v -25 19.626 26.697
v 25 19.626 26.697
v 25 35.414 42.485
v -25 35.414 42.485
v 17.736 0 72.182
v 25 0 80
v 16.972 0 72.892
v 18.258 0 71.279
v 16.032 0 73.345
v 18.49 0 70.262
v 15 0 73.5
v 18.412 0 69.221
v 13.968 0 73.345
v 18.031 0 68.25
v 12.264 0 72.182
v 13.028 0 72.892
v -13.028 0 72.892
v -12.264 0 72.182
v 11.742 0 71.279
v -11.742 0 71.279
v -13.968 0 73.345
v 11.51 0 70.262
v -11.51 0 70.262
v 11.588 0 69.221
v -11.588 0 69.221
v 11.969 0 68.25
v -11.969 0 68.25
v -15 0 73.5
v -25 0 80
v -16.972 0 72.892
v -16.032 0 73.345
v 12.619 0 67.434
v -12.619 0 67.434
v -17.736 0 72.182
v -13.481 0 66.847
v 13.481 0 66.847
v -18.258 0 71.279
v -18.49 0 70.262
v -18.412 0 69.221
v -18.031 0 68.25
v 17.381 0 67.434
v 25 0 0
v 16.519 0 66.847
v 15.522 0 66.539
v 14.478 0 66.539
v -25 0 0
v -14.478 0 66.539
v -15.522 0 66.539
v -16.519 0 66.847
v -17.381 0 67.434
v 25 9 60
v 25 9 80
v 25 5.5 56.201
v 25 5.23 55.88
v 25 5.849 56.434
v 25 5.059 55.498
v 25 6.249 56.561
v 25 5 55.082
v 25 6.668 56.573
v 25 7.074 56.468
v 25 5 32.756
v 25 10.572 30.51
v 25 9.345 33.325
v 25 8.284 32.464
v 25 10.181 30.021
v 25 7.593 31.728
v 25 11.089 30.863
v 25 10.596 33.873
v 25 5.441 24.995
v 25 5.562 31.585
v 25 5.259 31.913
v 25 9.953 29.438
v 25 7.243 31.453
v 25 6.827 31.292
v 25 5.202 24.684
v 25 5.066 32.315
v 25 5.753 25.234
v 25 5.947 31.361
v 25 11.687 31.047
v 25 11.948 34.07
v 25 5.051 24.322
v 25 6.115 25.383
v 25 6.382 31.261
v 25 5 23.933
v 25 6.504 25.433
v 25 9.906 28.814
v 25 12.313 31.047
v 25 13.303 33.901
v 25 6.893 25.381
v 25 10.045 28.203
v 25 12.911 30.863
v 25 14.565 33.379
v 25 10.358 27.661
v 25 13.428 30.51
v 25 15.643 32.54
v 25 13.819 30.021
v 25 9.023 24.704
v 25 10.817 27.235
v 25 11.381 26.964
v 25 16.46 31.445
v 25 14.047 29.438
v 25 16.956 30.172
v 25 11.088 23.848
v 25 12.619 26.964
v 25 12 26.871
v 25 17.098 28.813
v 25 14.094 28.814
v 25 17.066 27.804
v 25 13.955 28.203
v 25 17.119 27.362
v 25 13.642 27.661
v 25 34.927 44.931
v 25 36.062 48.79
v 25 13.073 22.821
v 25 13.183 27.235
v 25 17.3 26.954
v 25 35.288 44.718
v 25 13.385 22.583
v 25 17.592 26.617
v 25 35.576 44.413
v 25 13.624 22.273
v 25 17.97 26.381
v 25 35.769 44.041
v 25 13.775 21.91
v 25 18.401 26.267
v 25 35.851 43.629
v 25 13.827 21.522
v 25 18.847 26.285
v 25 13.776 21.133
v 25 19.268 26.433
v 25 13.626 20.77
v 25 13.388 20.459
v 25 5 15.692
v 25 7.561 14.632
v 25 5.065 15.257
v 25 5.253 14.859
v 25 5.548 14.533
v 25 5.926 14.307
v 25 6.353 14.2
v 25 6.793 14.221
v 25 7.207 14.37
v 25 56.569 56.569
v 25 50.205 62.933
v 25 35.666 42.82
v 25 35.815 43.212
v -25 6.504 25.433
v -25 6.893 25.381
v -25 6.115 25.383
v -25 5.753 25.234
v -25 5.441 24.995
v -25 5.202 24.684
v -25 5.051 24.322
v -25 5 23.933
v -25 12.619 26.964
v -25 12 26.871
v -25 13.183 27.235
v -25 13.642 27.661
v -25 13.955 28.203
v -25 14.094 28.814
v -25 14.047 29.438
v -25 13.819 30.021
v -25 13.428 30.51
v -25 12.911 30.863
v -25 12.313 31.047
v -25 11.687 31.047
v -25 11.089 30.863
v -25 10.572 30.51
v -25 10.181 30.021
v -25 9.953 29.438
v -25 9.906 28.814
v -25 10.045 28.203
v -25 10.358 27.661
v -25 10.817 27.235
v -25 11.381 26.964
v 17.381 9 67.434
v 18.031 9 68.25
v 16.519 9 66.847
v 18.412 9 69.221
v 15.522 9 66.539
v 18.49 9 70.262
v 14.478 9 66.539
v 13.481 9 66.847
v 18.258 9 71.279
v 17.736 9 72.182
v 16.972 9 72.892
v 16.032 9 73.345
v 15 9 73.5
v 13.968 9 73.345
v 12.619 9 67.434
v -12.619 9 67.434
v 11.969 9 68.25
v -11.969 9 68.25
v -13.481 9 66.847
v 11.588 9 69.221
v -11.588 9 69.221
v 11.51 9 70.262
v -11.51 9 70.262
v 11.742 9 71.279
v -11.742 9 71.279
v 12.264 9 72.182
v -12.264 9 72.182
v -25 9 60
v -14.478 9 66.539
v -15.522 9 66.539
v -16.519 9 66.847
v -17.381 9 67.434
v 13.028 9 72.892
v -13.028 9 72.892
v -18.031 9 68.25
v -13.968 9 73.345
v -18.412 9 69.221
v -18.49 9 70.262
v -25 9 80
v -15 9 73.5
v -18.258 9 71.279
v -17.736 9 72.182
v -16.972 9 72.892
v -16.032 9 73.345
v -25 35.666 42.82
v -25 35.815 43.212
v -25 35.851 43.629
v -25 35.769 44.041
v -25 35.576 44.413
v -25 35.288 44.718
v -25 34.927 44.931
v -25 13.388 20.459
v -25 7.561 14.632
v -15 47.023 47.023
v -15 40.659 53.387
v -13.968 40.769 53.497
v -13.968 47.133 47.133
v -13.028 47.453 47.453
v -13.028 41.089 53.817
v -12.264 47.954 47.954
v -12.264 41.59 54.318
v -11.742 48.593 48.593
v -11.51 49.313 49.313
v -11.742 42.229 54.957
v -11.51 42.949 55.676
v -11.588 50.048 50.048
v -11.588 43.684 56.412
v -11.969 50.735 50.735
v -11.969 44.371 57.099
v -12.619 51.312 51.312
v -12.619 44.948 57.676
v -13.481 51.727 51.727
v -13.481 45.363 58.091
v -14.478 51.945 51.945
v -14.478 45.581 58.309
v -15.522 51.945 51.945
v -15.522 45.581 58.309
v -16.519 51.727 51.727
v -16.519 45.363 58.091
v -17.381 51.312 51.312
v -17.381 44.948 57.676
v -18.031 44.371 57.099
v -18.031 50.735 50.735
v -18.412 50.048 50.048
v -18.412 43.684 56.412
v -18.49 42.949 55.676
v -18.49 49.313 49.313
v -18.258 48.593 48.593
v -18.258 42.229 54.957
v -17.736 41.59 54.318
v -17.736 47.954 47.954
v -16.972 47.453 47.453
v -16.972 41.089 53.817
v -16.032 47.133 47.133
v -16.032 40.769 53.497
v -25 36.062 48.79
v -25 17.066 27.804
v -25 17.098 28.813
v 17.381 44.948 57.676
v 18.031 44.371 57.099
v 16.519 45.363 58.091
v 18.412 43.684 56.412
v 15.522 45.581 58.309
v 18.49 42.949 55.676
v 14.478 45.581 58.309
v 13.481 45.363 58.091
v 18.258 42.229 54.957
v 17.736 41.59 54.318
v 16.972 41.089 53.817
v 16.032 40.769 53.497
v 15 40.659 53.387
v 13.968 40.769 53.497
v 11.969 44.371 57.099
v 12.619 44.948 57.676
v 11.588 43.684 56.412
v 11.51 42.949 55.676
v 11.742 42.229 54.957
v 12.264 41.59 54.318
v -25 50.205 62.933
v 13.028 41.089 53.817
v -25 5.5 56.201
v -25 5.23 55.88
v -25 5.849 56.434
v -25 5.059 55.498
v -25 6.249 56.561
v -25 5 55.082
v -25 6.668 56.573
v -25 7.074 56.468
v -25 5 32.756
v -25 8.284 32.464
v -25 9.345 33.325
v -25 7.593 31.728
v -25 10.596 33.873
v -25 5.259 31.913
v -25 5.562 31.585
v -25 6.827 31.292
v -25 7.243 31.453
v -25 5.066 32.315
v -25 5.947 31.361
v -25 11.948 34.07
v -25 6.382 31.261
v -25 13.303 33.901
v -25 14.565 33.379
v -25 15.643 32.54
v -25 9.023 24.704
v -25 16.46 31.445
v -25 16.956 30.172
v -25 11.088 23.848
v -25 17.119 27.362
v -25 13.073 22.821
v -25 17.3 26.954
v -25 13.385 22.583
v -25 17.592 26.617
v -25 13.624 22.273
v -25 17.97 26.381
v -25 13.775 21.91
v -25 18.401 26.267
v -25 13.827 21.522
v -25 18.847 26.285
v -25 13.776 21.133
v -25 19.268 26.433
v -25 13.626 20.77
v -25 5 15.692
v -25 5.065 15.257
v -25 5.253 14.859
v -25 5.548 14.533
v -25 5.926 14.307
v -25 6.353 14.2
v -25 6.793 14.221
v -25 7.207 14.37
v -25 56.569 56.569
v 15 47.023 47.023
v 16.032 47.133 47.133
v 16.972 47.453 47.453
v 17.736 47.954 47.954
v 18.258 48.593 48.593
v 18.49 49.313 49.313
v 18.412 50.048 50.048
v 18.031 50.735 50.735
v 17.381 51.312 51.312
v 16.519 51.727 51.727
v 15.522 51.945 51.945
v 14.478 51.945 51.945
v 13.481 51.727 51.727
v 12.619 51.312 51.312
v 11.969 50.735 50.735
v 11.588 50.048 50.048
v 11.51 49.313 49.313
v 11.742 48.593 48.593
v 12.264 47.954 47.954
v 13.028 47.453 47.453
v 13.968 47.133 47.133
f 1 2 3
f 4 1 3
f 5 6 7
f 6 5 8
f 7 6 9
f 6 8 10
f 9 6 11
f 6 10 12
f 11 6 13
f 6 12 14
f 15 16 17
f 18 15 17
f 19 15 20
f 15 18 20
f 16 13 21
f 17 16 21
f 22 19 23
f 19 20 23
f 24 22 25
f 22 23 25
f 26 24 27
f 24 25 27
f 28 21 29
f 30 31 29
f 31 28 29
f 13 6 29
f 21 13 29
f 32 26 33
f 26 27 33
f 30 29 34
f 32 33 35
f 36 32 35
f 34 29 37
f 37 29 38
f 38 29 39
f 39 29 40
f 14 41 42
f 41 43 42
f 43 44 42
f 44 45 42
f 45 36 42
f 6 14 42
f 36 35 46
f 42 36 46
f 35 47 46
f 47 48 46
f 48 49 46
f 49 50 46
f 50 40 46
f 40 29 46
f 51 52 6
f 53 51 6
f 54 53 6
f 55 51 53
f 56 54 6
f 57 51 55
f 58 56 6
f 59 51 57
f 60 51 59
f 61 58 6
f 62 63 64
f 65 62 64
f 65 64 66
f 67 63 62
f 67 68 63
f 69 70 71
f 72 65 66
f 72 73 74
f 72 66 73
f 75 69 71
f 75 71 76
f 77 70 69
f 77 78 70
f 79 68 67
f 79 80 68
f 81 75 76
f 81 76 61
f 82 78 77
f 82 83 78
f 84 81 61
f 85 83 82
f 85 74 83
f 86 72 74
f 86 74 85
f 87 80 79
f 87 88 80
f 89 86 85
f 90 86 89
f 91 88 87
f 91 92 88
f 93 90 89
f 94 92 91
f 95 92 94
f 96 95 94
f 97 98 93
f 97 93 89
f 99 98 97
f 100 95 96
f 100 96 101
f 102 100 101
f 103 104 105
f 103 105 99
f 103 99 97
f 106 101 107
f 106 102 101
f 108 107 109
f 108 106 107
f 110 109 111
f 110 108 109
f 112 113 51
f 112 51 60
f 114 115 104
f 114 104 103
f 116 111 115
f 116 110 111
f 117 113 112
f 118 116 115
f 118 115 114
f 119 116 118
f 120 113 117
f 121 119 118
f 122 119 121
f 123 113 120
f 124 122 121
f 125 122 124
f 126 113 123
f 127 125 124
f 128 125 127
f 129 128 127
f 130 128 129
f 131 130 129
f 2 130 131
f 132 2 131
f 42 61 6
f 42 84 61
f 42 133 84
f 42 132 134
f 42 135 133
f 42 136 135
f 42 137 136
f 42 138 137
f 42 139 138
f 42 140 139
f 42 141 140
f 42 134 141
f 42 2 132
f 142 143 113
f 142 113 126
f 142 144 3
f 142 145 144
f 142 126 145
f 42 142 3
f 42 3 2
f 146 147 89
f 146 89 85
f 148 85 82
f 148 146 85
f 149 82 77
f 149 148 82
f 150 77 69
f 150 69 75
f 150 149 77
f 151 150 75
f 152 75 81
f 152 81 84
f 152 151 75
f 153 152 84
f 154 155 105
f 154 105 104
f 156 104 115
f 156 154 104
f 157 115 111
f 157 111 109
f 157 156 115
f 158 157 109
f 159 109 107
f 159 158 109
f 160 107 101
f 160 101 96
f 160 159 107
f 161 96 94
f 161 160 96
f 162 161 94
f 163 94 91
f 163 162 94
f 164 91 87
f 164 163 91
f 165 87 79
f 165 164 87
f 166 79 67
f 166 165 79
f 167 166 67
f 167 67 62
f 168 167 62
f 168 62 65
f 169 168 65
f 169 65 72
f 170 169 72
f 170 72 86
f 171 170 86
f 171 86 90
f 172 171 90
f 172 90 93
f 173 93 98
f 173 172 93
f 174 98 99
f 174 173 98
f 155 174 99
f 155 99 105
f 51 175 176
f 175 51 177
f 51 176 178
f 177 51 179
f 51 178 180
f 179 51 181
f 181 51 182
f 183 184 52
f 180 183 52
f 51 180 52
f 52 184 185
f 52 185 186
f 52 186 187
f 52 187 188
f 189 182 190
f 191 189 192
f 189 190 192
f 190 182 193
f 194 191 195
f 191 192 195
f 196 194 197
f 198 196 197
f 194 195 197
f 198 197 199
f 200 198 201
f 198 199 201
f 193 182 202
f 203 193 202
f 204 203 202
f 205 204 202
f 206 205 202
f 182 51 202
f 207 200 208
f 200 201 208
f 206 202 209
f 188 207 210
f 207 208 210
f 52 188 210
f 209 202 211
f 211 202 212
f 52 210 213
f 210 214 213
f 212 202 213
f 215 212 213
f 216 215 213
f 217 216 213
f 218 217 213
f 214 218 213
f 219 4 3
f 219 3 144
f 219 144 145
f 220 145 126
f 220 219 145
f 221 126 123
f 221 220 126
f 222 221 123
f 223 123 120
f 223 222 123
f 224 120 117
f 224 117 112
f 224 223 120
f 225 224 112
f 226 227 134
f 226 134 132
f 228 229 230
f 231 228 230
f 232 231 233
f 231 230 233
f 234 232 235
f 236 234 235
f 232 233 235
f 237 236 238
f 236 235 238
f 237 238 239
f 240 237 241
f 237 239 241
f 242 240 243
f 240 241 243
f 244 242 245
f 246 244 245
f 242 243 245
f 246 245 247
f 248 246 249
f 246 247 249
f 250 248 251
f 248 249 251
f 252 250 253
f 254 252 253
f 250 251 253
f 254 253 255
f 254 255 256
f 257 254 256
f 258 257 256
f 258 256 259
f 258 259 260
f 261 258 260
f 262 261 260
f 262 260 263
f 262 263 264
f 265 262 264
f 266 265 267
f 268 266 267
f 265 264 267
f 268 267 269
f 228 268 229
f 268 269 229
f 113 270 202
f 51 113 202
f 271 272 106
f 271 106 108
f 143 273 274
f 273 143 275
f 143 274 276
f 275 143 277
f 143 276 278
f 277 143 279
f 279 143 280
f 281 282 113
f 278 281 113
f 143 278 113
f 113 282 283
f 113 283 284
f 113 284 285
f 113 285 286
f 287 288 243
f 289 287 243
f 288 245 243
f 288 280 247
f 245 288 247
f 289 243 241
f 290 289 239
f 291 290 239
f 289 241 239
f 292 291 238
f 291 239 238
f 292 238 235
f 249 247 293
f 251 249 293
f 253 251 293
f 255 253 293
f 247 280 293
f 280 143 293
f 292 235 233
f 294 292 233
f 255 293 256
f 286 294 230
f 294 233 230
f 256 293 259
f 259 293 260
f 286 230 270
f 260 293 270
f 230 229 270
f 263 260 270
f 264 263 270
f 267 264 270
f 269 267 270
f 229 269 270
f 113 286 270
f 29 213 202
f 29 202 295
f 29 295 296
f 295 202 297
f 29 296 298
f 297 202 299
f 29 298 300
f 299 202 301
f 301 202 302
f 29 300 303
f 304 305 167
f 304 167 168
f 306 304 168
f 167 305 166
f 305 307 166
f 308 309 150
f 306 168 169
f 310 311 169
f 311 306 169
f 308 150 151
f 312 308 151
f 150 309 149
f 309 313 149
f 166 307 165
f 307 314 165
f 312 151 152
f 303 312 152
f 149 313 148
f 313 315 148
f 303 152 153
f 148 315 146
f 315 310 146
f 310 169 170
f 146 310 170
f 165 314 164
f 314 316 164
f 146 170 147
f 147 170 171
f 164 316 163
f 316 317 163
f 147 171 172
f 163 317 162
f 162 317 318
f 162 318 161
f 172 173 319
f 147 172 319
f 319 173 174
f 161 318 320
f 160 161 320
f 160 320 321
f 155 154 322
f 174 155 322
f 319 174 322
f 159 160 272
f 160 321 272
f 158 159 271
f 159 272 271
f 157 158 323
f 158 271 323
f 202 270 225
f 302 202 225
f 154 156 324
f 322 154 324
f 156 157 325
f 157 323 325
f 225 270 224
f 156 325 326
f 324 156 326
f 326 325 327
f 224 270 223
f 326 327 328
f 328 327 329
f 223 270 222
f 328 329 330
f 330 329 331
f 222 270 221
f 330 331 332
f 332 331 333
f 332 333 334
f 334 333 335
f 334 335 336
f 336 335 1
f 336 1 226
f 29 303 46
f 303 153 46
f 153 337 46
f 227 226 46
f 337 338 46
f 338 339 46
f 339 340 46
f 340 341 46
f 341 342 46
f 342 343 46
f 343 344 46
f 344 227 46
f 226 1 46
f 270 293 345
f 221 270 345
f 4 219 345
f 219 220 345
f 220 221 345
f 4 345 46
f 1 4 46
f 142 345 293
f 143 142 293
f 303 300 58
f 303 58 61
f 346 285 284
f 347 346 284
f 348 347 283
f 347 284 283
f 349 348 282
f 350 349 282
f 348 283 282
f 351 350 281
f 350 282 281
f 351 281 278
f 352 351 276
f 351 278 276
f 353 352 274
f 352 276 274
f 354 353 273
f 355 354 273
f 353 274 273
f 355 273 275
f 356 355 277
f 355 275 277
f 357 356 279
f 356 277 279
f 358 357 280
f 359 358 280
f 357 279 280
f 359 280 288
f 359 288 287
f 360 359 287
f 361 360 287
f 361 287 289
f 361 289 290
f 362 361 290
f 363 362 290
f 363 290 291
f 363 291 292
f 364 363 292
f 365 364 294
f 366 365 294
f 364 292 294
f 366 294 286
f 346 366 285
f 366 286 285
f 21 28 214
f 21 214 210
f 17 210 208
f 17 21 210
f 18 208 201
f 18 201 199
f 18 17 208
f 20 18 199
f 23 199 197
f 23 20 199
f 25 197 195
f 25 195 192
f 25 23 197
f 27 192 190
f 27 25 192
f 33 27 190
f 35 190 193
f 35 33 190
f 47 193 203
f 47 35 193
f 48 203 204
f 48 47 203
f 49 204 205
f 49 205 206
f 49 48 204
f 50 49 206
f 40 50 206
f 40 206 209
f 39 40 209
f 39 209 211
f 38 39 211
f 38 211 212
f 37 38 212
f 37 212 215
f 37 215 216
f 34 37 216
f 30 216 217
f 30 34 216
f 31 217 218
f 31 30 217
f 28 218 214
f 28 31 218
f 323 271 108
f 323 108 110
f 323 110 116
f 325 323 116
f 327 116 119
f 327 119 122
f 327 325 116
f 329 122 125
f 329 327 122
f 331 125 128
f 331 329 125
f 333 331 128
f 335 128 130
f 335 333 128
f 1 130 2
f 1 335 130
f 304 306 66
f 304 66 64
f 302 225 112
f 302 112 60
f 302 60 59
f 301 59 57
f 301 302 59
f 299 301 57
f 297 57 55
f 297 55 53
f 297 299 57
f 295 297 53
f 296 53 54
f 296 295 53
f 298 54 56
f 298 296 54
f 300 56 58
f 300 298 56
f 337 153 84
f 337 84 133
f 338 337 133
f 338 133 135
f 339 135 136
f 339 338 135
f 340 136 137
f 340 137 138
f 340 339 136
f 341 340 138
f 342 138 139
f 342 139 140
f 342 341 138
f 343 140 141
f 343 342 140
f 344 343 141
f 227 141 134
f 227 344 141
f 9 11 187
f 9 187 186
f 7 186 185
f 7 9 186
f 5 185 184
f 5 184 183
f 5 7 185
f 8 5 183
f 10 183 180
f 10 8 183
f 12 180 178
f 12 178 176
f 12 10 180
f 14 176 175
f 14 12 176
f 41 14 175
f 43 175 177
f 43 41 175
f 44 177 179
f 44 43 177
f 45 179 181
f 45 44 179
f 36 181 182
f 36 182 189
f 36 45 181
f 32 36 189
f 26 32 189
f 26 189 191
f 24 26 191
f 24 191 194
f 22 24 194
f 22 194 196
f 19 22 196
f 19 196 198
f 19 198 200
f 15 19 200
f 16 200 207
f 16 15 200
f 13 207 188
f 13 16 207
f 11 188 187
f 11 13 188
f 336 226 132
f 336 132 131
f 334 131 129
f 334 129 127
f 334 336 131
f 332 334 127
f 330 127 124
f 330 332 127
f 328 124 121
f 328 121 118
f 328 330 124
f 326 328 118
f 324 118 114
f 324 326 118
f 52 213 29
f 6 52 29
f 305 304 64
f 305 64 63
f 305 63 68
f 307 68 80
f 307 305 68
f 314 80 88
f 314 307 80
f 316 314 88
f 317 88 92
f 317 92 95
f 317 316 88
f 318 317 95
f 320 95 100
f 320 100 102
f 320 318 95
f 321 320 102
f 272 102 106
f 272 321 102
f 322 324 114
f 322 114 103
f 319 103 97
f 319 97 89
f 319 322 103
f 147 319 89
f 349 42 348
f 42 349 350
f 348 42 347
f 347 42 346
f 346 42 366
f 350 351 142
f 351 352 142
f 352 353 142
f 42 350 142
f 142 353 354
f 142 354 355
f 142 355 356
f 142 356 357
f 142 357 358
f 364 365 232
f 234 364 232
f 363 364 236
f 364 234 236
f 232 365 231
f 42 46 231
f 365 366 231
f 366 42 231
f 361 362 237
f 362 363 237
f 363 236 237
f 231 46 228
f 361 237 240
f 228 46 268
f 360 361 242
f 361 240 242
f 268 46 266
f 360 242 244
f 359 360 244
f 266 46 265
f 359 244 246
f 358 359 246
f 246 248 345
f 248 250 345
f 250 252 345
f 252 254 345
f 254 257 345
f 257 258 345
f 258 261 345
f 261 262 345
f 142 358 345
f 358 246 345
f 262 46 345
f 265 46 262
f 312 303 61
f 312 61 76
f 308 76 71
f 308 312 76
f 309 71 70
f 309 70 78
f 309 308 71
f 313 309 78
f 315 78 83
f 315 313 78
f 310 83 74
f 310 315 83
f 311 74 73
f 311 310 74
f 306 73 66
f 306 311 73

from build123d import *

# Parameters (mm, degrees)
BOSS_EXTRUDE1_DEPTH      = 25
BOSS_EXTRUDE1_DEPTH_BACK = 25
SKETCH1_R                = 2.1
SKETCH2_R                = 3.5
CUT_EXTRUDE1_DEPTH       = 9
SKETCH3_R                = 3.5
CUT_EXTRUDE2_DEPTH       = 9
SKETCH4_R                = 3.5
CUT_EXTRUDE3_DEPTH       = 9
SKETCH5_R                = 3.5
CUT_EXTRUDE4_DEPTH       = 9


with BuildPart() as part:
    # Sketch1 → Boss-Extrude1 (new, two sides: drawn at the far end of the back side and taken through both)
    with BuildSketch(Plane(origin=(0, 0, 0), x_dir=(0, 0, -1), z_dir=(1, 0, 0)).offset(-BOSS_EXTRUDE1_DEPTH_BACK)):
        Polygon((-80, 0), (0, 0), (-56.568542495, 56.568542495), (-62.932503526, 50.204581464), (-48.790367902, 36.062445841), (-60, 9), (-80, 9), align=None)
        with Locations((-28.970562748, 12)):
            Circle(SKETCH1_R, mode=Mode.SUBTRACT)
        with BuildLine():
            Line((-23.933031567, 5), (-15.692388155, 5))
            ThreePointArc((-15.692388155, 5), (-14.306568857, 5.925974851), (-14.631727984, 7.560660172))
            Line((-14.631727984, 7.560660172), (-20.458742822, 13.38767501))
            ThreePointArc((-20.458742822, 13.38767501), (-21.717716442, 13.813847638), (-22.820979835, 13.072600329))
            ThreePointArc((-22.820979835, 13.072600329), (-24.298031724, 10.064574227), (-25.38059396, 6.893145161))
            ThreePointArc((-25.38059396, 6.893145161), (-25.124609878, 5.588879191), (-23.933031567, 5))
        make_face(mode=Mode.SUBTRACT)
        with BuildLine():
            Line((-55.082376804, 5), (-32.755922357, 5))
            ThreePointArc((-32.755922357, 5), (-31.361417837, 5.947408702), (-31.728467606, 7.592857143))
            Line((-31.728467606, 7.592857143), (-32.463908902, 8.284285714))
            ThreePointArc((-32.463908902, 8.284285714), (-33.682348364, 13.951685505), (-28.813324734, 17.097575522))
            Line((-28.813324734, 17.097575522), (-27.804375375, 17.066453827))
            ThreePointArc((-27.804375375, 17.066453827), (-26.381324244, 17.970418197), (-26.697468729, 19.626400917))
            Line((-26.697468729, 19.626400917), (-42.484656068, 35.413588256))
            ThreePointArc((-42.484656068, 35.413588256), (-43.837951723, 35.824106005), (-44.931135539, 34.926953233))
            Line((-44.931135539, 34.926953233), (-56.468196103, 7.074025149))
            ThreePointArc((-56.468196103, 7.074025149), (-56.329581223, 5.66664465), (-55.082376804, 5))
        make_face(mode=Mode.SUBTRACT)
    extrude(amount=BOSS_EXTRUDE1_DEPTH + BOSS_EXTRUDE1_DEPTH_BACK)

    # Sketch2 → Cut-Extrude1 (cut)
    with BuildSketch(Plane(origin=(0, -6.363961031, 6.363961031), x_dir=(1, 0, 0), z_dir=(0, -0.7071067811865467, 0.7071067811865485))):
        with Locations((-15, 70)):
            Circle(SKETCH2_R)
    extrude(amount=-CUT_EXTRUDE1_DEPTH, mode=Mode.SUBTRACT)

    # Sketch3 → Cut-Extrude2 (cut)
    with BuildSketch(Plane(origin=(0, -6.363961031, 6.363961031), x_dir=(1, 0, 0), z_dir=(0, -0.7071067811865467, 0.7071067811865485))):
        with Locations((15, 70)):
            Circle(SKETCH3_R)
    extrude(amount=-CUT_EXTRUDE2_DEPTH, mode=Mode.SUBTRACT)

    # Sketch4 → Cut-Extrude3 (cut)
    with BuildSketch(Plane(origin=(0, 0, 0), x_dir=(1, 0, 0), z_dir=(0, 1, 0))):
        with Locations((-15, -70)):
            Circle(SKETCH4_R)
    extrude(amount=CUT_EXTRUDE3_DEPTH, mode=Mode.SUBTRACT)

    # Sketch5 → Cut-Extrude4 (cut)
    with BuildSketch(Plane(origin=(0, 0, 0), x_dir=(1, 0, 0), z_dir=(0, 1, 0))):
        with Locations((15, -70)):
            Circle(SKETCH5_R)
    extrude(amount=CUT_EXTRUDE4_DEPTH, mode=Mode.SUBTRACT)


solid = part.part
